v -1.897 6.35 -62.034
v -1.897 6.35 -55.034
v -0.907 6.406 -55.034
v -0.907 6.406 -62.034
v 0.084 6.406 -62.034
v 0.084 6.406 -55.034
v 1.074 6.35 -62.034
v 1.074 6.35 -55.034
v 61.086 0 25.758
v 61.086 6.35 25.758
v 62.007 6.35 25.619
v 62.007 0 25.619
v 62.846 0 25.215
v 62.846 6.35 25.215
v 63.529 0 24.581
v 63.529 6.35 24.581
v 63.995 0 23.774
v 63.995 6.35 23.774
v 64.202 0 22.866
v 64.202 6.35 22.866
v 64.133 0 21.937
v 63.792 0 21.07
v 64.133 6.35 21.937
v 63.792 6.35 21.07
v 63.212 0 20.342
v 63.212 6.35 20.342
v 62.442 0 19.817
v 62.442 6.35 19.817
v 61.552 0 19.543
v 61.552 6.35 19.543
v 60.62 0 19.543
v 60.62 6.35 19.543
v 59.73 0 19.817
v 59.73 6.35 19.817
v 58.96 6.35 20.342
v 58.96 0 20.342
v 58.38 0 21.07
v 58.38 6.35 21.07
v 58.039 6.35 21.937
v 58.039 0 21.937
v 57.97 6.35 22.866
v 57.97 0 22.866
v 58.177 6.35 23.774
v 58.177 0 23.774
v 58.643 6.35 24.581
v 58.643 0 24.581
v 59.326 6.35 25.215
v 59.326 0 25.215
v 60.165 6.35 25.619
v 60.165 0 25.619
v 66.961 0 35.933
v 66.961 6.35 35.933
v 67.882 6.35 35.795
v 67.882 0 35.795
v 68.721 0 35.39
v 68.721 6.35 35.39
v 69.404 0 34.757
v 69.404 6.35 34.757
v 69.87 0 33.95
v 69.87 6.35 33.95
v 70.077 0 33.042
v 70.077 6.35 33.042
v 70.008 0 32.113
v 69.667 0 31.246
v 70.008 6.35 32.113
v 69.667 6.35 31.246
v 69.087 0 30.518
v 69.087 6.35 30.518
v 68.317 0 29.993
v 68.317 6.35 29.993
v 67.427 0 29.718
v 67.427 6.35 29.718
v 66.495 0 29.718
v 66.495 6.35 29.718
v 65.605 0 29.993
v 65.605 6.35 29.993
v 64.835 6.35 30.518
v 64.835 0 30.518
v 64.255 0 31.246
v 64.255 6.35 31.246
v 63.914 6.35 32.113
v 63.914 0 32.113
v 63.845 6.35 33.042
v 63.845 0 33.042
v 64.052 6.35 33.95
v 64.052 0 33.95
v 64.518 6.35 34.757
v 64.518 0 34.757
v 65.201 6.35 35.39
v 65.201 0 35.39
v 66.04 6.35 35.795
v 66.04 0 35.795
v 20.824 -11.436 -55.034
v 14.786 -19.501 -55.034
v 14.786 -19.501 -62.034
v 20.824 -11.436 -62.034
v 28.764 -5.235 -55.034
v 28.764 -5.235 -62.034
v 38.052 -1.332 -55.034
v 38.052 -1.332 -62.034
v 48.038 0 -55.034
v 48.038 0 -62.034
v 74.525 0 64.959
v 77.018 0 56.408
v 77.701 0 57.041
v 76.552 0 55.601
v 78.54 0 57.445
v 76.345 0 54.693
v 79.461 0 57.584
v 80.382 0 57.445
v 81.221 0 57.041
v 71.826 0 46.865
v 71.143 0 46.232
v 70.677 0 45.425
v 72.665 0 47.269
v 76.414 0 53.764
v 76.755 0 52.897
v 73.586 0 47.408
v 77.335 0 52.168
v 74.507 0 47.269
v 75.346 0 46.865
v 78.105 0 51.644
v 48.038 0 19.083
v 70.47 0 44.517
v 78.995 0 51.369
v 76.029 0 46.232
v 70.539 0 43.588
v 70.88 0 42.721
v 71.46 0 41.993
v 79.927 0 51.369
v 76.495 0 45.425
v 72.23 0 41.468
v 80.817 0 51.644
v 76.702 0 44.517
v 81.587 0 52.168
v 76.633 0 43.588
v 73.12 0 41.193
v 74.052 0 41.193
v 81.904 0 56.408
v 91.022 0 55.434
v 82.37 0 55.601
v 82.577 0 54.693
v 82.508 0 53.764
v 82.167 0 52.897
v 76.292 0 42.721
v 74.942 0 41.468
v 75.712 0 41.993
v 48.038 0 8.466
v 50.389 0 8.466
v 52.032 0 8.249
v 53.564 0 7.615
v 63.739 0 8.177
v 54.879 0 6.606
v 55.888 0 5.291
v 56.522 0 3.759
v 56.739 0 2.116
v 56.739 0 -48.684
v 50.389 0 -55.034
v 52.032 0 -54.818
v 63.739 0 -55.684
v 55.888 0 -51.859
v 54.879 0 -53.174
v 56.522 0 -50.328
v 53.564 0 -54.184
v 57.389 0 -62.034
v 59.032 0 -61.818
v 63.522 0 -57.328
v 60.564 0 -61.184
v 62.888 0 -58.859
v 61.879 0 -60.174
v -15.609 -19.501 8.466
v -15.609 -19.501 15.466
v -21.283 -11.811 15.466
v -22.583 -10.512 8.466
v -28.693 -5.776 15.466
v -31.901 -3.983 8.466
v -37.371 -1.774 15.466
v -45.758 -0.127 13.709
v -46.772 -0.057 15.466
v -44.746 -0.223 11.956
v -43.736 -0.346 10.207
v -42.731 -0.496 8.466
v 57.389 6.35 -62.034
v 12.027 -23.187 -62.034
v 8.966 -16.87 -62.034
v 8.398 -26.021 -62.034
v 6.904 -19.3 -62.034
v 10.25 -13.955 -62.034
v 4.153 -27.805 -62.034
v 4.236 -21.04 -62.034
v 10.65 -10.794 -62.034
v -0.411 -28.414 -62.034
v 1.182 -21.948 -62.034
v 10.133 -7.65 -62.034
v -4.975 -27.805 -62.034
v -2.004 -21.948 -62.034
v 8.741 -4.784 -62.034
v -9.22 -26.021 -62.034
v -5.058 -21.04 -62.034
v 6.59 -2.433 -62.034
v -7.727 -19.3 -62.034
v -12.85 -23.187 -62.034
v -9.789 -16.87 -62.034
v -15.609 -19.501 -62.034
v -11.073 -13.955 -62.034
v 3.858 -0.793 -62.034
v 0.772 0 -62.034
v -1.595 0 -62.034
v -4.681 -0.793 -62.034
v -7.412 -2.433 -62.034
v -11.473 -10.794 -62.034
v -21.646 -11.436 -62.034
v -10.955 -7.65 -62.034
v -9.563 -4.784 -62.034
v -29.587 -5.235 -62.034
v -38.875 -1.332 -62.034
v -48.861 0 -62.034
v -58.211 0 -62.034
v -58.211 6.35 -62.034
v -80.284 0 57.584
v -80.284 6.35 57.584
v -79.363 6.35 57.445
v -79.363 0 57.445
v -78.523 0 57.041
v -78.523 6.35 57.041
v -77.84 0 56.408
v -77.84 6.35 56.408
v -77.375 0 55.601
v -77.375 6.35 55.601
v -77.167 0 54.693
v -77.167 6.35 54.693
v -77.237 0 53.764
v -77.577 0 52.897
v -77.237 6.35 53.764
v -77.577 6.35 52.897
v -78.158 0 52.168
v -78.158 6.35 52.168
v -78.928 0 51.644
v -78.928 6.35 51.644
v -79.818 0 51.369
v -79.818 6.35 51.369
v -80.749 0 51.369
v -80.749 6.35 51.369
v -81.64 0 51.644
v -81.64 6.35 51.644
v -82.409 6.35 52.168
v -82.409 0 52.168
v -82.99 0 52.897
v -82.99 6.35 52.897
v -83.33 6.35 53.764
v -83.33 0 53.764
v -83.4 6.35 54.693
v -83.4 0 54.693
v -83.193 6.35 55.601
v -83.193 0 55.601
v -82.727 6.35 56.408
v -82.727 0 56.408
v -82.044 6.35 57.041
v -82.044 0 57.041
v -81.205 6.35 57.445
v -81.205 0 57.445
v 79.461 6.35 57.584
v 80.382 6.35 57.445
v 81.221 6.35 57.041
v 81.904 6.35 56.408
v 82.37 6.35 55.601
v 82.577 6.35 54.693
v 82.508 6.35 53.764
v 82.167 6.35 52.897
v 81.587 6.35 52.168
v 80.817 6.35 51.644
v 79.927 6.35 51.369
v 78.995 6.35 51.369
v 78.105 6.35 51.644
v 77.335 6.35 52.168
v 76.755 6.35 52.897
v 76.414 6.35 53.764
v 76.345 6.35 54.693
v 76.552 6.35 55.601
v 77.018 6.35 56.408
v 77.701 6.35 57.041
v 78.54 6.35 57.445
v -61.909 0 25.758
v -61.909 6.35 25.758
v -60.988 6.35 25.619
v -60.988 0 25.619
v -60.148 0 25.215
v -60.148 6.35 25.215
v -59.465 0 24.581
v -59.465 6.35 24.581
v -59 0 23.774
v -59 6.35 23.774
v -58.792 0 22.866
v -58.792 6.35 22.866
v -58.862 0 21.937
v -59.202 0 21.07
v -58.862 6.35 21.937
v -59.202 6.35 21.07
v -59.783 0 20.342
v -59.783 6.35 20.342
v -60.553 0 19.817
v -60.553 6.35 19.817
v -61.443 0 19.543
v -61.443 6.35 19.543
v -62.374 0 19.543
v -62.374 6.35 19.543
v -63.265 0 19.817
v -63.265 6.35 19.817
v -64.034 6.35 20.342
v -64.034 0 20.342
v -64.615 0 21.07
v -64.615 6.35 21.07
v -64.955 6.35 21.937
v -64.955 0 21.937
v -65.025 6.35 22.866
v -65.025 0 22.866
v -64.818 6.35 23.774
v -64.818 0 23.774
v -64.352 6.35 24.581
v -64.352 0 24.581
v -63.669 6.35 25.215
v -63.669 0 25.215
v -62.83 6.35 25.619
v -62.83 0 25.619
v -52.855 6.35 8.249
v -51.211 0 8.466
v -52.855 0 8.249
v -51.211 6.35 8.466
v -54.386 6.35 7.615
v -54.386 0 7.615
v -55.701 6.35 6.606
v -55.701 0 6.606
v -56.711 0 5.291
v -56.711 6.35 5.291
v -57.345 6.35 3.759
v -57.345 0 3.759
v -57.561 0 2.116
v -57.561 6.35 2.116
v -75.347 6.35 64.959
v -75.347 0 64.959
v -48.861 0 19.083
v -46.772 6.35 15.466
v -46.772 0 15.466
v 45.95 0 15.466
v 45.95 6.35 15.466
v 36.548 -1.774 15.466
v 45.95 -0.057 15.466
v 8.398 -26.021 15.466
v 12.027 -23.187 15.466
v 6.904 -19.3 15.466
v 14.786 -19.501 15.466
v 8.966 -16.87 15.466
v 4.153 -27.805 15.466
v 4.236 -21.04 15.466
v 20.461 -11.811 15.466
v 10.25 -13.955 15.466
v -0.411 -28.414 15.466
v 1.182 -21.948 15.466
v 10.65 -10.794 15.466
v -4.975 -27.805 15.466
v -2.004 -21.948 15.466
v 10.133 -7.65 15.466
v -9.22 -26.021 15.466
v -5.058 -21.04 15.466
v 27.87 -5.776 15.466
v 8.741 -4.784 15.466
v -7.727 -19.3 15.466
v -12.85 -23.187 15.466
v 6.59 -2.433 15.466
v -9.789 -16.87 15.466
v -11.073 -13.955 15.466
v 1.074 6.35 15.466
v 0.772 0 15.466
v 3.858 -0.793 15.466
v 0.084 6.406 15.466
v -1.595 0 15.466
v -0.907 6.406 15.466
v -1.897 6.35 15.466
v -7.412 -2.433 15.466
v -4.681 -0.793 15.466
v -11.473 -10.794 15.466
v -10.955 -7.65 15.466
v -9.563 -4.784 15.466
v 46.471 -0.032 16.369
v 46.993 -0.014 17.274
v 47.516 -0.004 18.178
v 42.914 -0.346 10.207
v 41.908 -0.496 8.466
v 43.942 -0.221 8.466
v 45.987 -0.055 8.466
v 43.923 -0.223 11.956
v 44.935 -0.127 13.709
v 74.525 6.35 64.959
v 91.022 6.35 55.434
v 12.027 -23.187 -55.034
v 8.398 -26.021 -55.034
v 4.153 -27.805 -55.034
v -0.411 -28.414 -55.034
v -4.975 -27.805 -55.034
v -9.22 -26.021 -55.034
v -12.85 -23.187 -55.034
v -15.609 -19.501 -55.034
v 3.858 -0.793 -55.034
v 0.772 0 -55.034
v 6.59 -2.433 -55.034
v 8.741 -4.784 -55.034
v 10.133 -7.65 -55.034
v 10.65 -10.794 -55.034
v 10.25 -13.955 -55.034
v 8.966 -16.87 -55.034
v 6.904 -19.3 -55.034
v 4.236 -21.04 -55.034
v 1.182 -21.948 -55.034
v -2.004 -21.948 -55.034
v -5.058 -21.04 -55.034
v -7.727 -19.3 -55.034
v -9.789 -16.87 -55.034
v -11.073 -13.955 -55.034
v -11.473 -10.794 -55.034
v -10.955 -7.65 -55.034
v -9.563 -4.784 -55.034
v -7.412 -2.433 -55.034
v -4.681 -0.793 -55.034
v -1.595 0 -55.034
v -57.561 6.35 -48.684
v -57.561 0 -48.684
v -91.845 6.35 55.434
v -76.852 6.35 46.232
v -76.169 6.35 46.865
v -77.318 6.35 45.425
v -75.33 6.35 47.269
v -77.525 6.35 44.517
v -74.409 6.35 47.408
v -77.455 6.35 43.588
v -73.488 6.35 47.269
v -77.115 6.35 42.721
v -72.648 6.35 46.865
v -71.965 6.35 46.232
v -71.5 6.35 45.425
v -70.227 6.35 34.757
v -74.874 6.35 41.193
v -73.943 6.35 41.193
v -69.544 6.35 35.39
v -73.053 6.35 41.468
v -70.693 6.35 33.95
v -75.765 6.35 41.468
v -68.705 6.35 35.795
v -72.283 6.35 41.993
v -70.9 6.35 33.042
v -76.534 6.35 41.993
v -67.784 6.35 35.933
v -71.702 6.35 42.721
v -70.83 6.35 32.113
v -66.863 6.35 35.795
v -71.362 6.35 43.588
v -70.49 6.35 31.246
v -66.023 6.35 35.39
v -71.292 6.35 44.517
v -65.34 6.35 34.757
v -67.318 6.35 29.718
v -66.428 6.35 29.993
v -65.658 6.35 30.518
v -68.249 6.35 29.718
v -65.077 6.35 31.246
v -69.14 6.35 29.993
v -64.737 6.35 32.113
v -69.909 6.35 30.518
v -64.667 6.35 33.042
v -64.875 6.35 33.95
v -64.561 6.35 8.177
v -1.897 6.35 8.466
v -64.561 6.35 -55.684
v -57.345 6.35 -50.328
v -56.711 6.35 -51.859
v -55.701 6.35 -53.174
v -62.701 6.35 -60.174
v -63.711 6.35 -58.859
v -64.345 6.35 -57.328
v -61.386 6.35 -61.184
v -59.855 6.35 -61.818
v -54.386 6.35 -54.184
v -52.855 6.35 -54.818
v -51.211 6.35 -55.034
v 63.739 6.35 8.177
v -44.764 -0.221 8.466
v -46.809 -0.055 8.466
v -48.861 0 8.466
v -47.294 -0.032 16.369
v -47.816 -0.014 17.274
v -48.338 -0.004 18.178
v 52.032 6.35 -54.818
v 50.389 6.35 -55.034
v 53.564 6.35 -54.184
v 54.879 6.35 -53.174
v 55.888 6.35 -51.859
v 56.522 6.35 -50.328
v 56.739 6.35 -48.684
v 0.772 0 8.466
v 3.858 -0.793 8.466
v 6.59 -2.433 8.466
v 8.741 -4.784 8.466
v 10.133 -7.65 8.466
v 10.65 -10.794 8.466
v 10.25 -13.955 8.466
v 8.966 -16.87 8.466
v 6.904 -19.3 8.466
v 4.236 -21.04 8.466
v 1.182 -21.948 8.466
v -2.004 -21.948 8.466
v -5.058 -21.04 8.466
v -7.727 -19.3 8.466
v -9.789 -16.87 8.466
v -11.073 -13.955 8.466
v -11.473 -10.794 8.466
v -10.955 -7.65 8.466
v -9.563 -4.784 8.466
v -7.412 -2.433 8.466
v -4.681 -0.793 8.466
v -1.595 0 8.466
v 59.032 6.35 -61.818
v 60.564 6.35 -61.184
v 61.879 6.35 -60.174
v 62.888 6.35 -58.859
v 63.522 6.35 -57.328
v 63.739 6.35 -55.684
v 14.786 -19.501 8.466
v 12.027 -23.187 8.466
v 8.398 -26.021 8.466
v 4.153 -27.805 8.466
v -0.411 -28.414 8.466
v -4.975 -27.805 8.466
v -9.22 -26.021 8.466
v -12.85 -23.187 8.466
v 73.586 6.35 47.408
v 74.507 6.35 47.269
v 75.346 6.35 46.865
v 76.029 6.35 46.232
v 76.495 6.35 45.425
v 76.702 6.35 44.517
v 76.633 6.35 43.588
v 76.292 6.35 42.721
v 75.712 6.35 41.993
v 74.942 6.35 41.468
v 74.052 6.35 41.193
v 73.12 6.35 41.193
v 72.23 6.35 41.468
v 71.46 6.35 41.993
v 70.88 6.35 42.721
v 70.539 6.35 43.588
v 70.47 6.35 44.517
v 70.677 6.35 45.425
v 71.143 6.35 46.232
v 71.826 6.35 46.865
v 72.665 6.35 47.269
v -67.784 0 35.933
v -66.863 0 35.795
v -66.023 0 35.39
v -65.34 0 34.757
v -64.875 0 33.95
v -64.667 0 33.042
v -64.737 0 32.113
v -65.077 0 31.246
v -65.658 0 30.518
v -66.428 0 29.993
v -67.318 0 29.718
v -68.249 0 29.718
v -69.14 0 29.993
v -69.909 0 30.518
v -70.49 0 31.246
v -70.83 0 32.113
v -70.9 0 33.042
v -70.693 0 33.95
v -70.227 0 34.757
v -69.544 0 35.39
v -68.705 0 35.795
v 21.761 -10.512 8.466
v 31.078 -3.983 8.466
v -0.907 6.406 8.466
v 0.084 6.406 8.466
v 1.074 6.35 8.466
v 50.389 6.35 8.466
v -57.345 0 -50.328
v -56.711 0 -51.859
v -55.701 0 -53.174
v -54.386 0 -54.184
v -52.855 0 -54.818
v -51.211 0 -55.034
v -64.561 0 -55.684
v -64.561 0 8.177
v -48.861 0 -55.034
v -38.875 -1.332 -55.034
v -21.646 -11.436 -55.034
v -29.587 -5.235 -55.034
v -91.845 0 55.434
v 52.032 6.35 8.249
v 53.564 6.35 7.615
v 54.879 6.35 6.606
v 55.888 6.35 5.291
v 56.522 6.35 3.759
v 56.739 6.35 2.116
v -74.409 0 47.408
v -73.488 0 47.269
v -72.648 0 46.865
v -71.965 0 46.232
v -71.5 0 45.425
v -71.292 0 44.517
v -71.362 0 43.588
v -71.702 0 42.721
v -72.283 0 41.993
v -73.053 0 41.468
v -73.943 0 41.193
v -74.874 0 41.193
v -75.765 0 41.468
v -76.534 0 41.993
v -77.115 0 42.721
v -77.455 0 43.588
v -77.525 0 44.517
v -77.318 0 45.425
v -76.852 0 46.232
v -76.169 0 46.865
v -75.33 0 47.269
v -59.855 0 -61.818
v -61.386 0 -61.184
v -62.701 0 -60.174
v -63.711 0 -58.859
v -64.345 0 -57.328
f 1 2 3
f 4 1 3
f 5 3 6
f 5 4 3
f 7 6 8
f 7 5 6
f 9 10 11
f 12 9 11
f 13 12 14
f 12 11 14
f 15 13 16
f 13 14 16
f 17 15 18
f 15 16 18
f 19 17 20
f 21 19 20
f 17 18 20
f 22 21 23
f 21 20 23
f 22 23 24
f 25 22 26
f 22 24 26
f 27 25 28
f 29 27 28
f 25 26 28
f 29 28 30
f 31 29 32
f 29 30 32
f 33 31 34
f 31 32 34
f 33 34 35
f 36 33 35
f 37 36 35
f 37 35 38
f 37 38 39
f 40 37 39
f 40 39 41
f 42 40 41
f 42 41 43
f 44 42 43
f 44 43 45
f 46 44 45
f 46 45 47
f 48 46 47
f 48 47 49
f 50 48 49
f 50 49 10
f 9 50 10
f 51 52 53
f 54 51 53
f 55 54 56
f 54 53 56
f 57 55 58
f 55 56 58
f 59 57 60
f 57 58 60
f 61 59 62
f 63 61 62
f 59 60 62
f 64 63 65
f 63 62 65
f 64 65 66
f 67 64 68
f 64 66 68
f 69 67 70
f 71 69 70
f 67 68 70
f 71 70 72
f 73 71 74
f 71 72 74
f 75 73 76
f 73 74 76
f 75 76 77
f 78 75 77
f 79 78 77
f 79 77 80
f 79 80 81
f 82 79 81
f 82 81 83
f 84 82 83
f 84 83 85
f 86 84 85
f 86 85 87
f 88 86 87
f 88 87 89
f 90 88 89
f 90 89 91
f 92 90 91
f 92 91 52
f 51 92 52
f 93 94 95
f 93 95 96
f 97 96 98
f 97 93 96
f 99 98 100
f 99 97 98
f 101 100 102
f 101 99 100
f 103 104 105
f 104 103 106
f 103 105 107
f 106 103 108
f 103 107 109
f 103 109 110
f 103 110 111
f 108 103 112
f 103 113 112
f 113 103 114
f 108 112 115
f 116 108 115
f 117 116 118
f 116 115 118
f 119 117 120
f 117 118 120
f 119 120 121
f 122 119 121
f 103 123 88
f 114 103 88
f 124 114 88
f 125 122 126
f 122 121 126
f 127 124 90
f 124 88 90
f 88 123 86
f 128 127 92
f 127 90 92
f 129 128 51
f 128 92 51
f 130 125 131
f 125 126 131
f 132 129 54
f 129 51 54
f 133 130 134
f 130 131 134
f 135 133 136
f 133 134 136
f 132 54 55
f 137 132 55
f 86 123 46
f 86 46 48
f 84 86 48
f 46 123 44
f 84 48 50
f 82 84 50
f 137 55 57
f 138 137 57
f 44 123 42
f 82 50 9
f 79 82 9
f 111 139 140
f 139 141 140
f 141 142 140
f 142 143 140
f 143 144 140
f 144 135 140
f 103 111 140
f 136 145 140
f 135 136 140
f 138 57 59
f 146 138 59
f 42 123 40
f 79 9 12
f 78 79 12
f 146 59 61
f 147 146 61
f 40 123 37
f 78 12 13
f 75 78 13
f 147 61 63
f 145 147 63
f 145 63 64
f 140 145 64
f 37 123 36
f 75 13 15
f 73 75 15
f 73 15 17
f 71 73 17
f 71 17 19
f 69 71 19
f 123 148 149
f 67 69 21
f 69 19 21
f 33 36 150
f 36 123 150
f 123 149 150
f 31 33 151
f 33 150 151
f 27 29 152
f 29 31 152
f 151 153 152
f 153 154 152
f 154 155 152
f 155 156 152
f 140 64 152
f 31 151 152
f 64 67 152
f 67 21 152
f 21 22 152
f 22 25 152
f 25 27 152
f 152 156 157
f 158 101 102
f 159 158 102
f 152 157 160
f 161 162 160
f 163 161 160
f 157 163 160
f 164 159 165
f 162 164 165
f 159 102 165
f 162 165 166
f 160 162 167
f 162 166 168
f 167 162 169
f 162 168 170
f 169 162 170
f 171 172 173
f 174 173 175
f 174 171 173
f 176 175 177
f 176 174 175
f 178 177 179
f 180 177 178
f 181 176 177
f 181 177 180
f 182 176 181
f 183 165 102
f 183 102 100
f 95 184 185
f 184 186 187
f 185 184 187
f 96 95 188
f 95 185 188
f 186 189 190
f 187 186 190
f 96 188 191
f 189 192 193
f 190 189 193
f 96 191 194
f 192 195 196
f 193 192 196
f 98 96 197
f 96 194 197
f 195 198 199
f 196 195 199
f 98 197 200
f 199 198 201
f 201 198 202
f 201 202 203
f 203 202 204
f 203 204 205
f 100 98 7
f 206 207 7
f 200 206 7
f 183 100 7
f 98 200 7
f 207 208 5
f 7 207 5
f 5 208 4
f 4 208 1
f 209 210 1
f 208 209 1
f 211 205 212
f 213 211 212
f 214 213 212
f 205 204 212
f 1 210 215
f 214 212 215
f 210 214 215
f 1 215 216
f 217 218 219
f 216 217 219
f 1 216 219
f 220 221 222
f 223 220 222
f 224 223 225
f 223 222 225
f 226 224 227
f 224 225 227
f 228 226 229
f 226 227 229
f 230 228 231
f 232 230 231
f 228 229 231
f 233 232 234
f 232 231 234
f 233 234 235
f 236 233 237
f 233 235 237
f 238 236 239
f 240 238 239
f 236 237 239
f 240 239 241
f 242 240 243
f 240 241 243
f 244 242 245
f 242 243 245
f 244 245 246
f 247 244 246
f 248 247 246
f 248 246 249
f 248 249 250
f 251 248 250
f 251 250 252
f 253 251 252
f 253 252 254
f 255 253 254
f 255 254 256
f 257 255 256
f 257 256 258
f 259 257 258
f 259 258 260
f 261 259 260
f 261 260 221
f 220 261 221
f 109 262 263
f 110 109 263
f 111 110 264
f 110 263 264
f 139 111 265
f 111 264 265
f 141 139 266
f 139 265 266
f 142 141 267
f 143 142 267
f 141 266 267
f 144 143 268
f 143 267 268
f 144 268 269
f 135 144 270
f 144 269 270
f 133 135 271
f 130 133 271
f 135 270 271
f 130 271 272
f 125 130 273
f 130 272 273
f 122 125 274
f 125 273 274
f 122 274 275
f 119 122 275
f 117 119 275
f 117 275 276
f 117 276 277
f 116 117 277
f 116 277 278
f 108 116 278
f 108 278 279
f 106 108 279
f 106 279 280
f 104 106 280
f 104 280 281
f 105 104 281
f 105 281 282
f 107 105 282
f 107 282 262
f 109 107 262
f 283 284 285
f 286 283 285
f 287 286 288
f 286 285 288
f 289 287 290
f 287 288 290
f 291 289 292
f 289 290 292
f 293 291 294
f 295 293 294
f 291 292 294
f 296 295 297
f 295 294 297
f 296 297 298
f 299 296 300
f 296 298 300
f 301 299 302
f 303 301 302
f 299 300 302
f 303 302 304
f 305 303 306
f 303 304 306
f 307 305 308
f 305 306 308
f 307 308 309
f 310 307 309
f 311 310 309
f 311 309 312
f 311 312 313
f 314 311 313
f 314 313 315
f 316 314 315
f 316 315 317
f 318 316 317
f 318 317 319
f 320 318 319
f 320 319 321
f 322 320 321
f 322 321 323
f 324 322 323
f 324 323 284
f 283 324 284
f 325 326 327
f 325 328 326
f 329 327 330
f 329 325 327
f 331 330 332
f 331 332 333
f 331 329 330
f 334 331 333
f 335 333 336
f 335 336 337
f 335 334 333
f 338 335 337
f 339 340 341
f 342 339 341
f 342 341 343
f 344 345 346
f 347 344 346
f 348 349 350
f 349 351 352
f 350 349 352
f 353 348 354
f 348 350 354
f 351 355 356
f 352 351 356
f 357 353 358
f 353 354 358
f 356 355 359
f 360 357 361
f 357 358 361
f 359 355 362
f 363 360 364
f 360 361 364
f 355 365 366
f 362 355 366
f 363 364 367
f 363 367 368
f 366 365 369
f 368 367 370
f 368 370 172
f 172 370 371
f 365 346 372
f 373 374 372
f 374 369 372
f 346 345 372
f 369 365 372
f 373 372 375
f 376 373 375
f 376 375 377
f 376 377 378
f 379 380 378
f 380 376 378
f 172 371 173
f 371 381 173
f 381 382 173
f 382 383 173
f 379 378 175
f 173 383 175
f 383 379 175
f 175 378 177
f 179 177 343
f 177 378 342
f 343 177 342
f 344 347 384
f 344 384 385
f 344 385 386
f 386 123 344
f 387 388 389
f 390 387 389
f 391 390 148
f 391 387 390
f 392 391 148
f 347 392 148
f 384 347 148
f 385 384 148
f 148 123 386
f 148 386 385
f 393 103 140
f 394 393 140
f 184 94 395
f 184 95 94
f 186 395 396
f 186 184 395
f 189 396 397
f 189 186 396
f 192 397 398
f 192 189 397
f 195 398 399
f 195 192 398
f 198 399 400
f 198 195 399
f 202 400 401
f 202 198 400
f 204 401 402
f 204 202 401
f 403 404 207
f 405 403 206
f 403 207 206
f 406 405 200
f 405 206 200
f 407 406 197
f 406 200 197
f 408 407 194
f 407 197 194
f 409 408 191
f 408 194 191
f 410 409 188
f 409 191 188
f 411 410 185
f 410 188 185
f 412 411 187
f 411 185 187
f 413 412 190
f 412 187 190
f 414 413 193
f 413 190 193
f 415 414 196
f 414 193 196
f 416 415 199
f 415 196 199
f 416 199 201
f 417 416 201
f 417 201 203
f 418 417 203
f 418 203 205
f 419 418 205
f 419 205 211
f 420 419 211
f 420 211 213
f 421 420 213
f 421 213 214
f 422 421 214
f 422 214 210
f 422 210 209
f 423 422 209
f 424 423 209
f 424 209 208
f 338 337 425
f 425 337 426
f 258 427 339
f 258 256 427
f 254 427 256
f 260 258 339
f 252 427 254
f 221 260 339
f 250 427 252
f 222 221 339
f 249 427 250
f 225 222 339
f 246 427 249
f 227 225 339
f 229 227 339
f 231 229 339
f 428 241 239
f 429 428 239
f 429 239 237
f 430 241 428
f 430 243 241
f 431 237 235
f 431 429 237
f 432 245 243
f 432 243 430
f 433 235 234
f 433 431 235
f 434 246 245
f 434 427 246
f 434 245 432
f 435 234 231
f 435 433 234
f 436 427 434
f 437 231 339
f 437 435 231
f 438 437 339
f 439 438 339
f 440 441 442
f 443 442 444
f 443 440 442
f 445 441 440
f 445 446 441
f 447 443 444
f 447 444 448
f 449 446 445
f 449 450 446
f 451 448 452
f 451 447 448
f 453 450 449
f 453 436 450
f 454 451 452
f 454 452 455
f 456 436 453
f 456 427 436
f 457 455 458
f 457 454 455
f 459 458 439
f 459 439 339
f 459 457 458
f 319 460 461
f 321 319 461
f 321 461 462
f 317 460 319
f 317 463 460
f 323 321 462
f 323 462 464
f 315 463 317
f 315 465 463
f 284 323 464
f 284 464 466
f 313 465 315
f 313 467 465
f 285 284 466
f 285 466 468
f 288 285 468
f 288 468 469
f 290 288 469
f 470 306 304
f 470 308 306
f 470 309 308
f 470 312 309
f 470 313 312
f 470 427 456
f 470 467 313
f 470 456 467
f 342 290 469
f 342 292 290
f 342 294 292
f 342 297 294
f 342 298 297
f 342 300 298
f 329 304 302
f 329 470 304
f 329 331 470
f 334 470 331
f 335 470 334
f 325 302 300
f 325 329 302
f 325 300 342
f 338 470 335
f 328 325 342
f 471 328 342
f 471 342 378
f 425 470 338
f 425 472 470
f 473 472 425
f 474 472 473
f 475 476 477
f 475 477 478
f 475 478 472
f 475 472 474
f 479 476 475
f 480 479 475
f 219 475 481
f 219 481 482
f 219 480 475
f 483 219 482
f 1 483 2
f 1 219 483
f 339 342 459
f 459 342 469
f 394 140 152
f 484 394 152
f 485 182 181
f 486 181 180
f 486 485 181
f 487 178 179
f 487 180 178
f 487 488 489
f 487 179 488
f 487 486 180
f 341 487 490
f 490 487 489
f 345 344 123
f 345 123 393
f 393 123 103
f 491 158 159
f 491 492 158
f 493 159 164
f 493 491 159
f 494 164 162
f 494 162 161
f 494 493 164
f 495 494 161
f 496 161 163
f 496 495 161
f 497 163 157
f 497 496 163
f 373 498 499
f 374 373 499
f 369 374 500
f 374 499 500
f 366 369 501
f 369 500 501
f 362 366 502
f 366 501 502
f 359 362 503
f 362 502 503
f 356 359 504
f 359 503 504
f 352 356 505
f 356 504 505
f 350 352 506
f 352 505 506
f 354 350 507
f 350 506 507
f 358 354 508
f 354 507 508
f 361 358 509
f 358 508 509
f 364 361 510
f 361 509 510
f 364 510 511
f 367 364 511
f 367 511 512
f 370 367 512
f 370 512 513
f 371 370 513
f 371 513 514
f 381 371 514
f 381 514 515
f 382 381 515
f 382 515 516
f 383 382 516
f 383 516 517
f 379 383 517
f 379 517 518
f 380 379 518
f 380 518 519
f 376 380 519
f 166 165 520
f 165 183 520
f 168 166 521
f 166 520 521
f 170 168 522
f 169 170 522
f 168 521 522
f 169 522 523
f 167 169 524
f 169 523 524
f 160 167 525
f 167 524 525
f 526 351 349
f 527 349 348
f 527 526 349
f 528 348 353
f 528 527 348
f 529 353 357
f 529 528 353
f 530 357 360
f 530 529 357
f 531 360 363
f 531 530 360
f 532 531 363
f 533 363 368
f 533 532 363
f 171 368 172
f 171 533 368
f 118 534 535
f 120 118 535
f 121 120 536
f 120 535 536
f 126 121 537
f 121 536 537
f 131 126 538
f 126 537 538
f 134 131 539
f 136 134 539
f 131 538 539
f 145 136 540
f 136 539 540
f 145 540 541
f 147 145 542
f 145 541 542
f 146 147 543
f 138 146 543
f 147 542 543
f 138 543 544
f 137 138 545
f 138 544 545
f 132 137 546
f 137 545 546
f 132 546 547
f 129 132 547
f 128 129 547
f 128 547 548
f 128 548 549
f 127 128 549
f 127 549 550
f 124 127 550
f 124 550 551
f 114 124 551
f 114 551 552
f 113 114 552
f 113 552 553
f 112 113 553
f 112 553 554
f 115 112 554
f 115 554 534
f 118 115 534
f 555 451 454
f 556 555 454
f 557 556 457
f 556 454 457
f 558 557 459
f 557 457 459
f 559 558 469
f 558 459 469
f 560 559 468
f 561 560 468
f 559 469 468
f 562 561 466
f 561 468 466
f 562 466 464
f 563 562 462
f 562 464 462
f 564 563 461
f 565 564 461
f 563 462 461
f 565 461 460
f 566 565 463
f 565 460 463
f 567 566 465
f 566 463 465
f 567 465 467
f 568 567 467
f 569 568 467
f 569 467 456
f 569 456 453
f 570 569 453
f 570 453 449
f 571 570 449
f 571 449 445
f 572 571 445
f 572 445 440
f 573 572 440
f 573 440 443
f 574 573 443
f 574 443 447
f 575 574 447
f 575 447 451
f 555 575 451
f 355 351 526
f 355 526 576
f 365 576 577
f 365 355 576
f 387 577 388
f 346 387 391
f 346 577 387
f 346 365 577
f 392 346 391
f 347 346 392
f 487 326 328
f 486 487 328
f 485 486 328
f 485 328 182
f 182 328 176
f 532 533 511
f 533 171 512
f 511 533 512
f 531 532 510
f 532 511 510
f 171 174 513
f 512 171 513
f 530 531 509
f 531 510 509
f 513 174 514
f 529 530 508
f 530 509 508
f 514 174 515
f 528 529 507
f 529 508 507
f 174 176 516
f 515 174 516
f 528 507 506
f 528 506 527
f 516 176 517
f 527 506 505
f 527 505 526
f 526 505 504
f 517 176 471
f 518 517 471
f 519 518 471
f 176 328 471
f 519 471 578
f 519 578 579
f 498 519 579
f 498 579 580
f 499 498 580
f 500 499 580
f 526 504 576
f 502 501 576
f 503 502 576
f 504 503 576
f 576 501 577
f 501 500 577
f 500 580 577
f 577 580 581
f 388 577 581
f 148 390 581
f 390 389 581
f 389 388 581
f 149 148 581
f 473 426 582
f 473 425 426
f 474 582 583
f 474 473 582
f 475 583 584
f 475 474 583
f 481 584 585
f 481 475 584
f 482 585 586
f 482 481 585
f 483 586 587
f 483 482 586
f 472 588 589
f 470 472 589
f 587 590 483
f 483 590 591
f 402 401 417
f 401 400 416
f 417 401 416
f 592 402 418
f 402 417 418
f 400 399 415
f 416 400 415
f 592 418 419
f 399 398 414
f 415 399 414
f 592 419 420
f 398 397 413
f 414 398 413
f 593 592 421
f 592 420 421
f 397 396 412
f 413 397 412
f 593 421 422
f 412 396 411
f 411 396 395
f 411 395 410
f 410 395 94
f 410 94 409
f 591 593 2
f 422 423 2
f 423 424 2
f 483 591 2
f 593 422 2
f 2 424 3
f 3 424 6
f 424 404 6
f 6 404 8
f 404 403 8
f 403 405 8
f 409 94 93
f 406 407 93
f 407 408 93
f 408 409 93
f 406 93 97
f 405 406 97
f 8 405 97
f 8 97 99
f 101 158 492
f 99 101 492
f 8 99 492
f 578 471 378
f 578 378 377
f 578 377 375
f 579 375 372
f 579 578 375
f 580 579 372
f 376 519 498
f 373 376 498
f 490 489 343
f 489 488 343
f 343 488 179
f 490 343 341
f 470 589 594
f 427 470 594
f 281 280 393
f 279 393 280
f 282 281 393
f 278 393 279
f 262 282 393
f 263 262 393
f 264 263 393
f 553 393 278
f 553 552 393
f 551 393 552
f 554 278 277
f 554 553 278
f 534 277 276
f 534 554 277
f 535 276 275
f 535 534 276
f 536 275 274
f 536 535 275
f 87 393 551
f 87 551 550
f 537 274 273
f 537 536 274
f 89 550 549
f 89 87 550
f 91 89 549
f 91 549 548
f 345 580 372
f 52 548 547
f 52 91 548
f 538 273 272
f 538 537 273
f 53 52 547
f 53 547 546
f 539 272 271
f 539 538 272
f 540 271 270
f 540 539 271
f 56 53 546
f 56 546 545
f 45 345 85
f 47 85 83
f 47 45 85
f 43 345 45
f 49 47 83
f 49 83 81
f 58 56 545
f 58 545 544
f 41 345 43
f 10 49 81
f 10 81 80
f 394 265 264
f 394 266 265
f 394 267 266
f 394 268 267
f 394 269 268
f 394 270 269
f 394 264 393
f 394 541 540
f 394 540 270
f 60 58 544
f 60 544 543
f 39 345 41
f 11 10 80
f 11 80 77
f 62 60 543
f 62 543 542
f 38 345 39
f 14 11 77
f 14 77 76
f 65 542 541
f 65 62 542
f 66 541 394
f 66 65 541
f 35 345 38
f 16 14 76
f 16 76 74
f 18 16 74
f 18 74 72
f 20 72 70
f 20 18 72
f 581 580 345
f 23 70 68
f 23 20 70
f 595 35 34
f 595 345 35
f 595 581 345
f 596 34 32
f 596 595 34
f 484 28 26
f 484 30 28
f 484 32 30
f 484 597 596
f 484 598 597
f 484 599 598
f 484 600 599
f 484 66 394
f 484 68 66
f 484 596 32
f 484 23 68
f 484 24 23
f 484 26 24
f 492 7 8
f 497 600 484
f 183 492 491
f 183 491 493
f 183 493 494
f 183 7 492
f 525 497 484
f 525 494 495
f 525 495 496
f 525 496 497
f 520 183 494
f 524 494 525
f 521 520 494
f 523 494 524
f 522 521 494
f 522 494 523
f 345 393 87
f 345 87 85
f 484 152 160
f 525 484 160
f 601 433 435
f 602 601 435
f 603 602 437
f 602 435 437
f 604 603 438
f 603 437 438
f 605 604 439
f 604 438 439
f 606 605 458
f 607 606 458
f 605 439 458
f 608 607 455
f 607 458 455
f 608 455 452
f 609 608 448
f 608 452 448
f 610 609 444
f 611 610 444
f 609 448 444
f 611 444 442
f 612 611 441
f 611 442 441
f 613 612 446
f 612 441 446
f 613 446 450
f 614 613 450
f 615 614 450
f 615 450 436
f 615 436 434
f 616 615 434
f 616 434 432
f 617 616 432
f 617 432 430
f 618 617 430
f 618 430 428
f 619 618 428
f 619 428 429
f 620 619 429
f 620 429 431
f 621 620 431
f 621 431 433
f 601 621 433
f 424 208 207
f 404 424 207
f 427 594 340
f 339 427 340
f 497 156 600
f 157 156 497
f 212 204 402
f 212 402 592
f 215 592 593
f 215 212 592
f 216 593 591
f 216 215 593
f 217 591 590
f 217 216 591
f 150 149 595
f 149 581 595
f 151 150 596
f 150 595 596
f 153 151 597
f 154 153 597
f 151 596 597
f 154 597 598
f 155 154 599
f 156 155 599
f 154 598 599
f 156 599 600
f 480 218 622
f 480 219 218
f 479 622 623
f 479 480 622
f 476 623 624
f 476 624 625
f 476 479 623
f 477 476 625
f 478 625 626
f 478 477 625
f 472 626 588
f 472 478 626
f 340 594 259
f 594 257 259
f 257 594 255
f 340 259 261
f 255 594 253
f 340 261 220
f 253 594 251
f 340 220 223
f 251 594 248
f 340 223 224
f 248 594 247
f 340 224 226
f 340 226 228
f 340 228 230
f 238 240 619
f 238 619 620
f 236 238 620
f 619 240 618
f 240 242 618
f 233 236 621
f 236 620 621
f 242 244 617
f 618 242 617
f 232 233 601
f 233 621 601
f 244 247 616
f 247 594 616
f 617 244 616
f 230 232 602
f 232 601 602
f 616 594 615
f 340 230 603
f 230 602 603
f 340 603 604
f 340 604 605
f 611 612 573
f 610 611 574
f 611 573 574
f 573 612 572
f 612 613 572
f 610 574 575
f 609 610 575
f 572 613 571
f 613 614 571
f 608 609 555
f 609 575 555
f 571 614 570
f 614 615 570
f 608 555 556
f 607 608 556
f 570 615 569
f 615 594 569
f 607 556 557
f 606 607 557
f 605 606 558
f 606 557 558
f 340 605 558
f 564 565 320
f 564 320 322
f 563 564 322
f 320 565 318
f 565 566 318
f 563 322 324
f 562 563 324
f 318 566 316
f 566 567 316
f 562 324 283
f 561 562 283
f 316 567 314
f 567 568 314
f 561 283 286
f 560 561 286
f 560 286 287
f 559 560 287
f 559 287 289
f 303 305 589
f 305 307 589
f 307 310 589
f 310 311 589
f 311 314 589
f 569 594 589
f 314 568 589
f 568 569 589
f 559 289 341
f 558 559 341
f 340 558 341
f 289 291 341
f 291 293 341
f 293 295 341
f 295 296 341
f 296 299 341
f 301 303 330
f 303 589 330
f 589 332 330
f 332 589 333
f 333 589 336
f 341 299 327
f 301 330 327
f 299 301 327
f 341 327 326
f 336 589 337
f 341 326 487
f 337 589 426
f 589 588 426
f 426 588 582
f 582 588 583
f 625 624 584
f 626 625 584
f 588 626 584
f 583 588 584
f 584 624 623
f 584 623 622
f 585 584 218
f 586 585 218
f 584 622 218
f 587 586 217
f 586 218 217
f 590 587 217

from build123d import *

# Parameters (mm, degrees)
SKETCH2_W               = 114.3
SKETCH2_H               = 63.5
BOSS_EXTRUDE1_DEPTH     = 6.35
CUT_EXTRUDE1_REACH      = 114.674
SKETCH3_R               = 3.125
BOSS_EXTRUDE7_REACH     = 158.854
SKETCH5_R               = 17.4135
SKETCH5_R_2             = 11.0635
FILLET1_R               = 38.1
CUT_EXTRUDE2_DEPTH      = 118.744132595
CUT_EXTRUDE2_DEPTH_BACK = 118.744132595
SKETCH6_W               = 114.3
SKETCH6_H               = 63.5
FILLET2_R               = 6.35


with BuildPart() as part:
    # Sketch2 → Boss-Extrude1 (new body)
    with BuildSketch(Plane(origin=(0, 0, 0), x_dir=(1, 0, 0), z_dir=(0, 1, 0))):
        Polygon((-64.561316825, 62.034331754), (-64.561316825, -8.177280248), (-91.845008266, -55.434020042), (-75.347224324, -64.959020042), (-46.772224324, -15.465668216), (45.949590674, -15.465668216), (74.524590674, -64.959020042), (91.022374616, -55.434020042), (63.738683175, -8.177280248), (63.738683175, 62.034331754), align=None)
        with Locations((-0.411316825, 23.284331754)):
            Rectangle(SKETCH2_W, SKETCH2_H, mode=Mode.SUBTRACT)
    extrude(amount=BOSS_EXTRUDE1_DEPTH)

    # Sketch3 → Cut-Extrude1 (cut, up to next)
    with BuildSketch(Plane(origin=(0, 6.35, 0), x_dir=(1, 0, 0), z_dir=(0, 1, 0)), mode=Mode.PRIVATE) as cut_extrude1_sk1:
        with Locations(Location((-67.783616297, -32.808466651, 0), (0, 0, 270))):
            Circle(SKETCH3_R)
    cut_extrude1_tool1 = extrude(cut_extrude1_sk1.sketch, amount=-CUT_EXTRUDE1_REACH, mode=Mode.PRIVATE) & part.part
    # Sketch3 → Cut-Extrude1 (cut, up to next)
    with BuildSketch(Plane(origin=(0, 6.35, 0), x_dir=(1, 0, 0), z_dir=(0, 1, 0)), mode=Mode.PRIVATE) as cut_extrude1_sk2:
        with Locations(Location((-61.908616236, -22.632668051, 0), (0, 0, 270))):
            Circle(SKETCH3_R)
    cut_extrude1_tool2 = extrude(cut_extrude1_sk2.sketch, amount=-CUT_EXTRUDE1_REACH, mode=Mode.PRIVATE) & part.part
    # Sketch3 → Cut-Extrude1 (cut, up to next)
    with BuildSketch(Plane(origin=(0, 6.35, 0), x_dir=(1, 0, 0), z_dir=(0, 1, 0)), mode=Mode.PRIVATE) as cut_extrude1_sk3:
        with Locations(Location((-74.408616255, -44.283303179, 0), (0, 0, 270))):
            Circle(SKETCH3_R)
    cut_extrude1_tool3 = extrude(cut_extrude1_sk3.sketch, amount=-CUT_EXTRUDE1_REACH, mode=Mode.PRIVATE) & part.part
    # Sketch3 → Cut-Extrude1 (cut, up to next)
    with BuildSketch(Plane(origin=(0, 6.35, 0), x_dir=(1, 0, 0), z_dir=(0, 1, 0)), mode=Mode.PRIVATE) as cut_extrude1_sk4:
        with Locations(Location((-80.283616316, -54.459101779, 0), (0, 0, 270))):
            Circle(SKETCH3_R)
    cut_extrude1_tool4 = extrude(cut_extrude1_sk4.sketch, amount=-CUT_EXTRUDE1_REACH, mode=Mode.PRIVATE) & part.part
    # Sketch3 → Cut-Extrude1 (cut, up to next)
    with BuildSketch(Plane(origin=(0, 6.35, 0), x_dir=(1, 0, 0), z_dir=(0, 1, 0)), mode=Mode.PRIVATE) as cut_extrude1_sk5:
        with Locations(Location((79.460982666, -54.459101779, 0), (0, 0, 270))):
            Circle(SKETCH3_R)
    cut_extrude1_tool5 = extrude(cut_extrude1_sk5.sketch, amount=-CUT_EXTRUDE1_REACH, mode=Mode.PRIVATE) & part.part
    # Sketch3 → Cut-Extrude1 (cut, up to next)
    with BuildSketch(Plane(origin=(0, 6.35, 0), x_dir=(1, 0, 0), z_dir=(0, 1, 0)), mode=Mode.PRIVATE) as cut_extrude1_sk6:
        with Locations(Location((73.585982605, -44.283303179, 0), (0, 0, 270))):
            Circle(SKETCH3_R)
    cut_extrude1_tool6 = extrude(cut_extrude1_sk6.sketch, amount=-CUT_EXTRUDE1_REACH, mode=Mode.PRIVATE) & part.part
    # Sketch3 → Cut-Extrude1 (cut, up to next)
    with BuildSketch(Plane(origin=(0, 6.35, 0), x_dir=(1, 0, 0), z_dir=(0, 1, 0)), mode=Mode.PRIVATE) as cut_extrude1_sk7:
        with Locations(Location((61.085982586, -22.632668051, 0), (0, 0, 270))):
            Circle(SKETCH3_R)
    cut_extrude1_tool7 = extrude(cut_extrude1_sk7.sketch, amount=-CUT_EXTRUDE1_REACH, mode=Mode.PRIVATE) & part.part
    # Sketch3 → Cut-Extrude1 (cut, up to next)
    with BuildSketch(Plane(origin=(0, 6.35, 0), x_dir=(1, 0, 0), z_dir=(0, 1, 0)), mode=Mode.PRIVATE) as cut_extrude1_sk8:
        with Locations(Location((66.960982647, -32.808466651, 0), (0, 0, 270))):
            Circle(SKETCH3_R)
    cut_extrude1_tool8 = extrude(cut_extrude1_sk8.sketch, amount=-CUT_EXTRUDE1_REACH, mode=Mode.PRIVATE) & part.part
    add(cut_extrude1_tool1.solids().sort_by_distance((-67.783616, 6.35, 32.808467))[0], mode=Mode.SUBTRACT)
    add(cut_extrude1_tool2.solids().sort_by_distance((-61.908616, 6.35, 22.632668))[0], mode=Mode.SUBTRACT)
    add(cut_extrude1_tool3.solids().sort_by_distance((-74.408616, 6.35, 44.283303))[0], mode=Mode.SUBTRACT)
    add(cut_extrude1_tool4.solids().sort_by_distance((-80.283616, 6.35, 54.459102))[0], mode=Mode.SUBTRACT)
    add(cut_extrude1_tool5.solids().sort_by_distance((79.460983, 6.35, 54.459102))[0], mode=Mode.SUBTRACT)
    add(cut_extrude1_tool6.solids().sort_by_distance((73.585983, 6.35, 44.283303))[0], mode=Mode.SUBTRACT)
    add(cut_extrude1_tool7.solids().sort_by_distance((61.085983, 6.35, 22.632668))[0], mode=Mode.SUBTRACT)
    add(cut_extrude1_tool8.solids().sort_by_distance((66.960983, 6.35, 32.808467))[0], mode=Mode.SUBTRACT)

    # Boss-Extrude7: up to this face of the body (flat: up to its plane)
    boss_extrude7_end = Plane(part.part.faces().sort_by_distance((-0.411316825, 3.175, 15.465668216))[0])
    # Sketch5 → Boss-Extrude7 (add, up to the picked face)
    with BuildSketch(Plane(origin=(0, 0, -62.034331754), x_dir=(-1, 0, 0), z_dir=(0, 0, -1)), mode=Mode.PRIVATE) as boss_extrude7_sk1:
        with Locations(Location((0.411316825, -11, 0), (0, 0, 39.175198934))):
            Circle(SKETCH5_R)
        with Locations(Location((0.411316825, -11, 0), (0, 0, 83.858334426))):
            Circle(SKETCH5_R_2, mode=Mode.SUBTRACT)
    boss_extrude7_tool1 = split(extrude(boss_extrude7_sk1.sketch, amount=-BOSS_EXTRUDE7_REACH, mode=Mode.PRIVATE), bisect_by=boss_extrude7_end, keep=Keep.BOTH, mode=Mode.PRIVATE)
    add(boss_extrude7_tool1.solids().sort_by(Axis((12.706125, -21.688873, -62.034332), (0, 0, 1)))[0])

    # Fillet1
    # the kernel refuses this fillet: 38.1 mm, written as the material it adds along each edge
    with BuildSketch(Plane(origin=(-13.910575406, 0, -62.034331754), x_dir=(-0.0867632885558369, -0.9962289554911443, 0), z_dir=(0, 0, 1))) as fillet1_piece_1:
        with BuildLine():
            CenterArc((40.988707325, -31.512603208), FILLET1_R, 124.197770407, 60.77965812)
            Line((3.032384121, -34.818284502), (0, 0))
            ThreePointArc((0, 0), (9.787278443, -3.010751549), (19.574556886, 0))
        make_face()
    extrude(amount=7)
    with BuildSketch(Plane(origin=(-13.910575406, 0, -62.034331754), x_dir=(-0.0867632885558369, -0.9962289554911443, 0), z_dir=(0, 0, 1))) as fillet1_piece_2_section:
        with BuildLine():
            CenterArc((40.988707325, -31.512603208), FILLET1_R, 124.197770407, 60.77965812)
            Line((3.032384121, -34.818284502), (0, 0))
            ThreePointArc((0, 0), (9.787278443, -3.010751549), (19.574556886, 0))
        make_face()
    fillet1_piece_2 = extrude(amount=94.37520705, mode=Mode.PRIVATE)
    fillet1_piece_2 = split(fillet1_piece_2, bisect_by=Plane(origin=(-46.479711347, 0.329171961, 15.465668216), z_dir=(0, 0, -1)), keep=Keep.TOP, mode=Mode.PRIVATE)
    fillet1_piece_2 = split(fillet1_piece_2, bisect_by=Plane(origin=(-46.479711347, 0.329171961, 8.465668246), z_dir=(0, 0, 1)), keep=Keep.TOP, mode=Mode.PRIVATE)
    fillet1_piece_2 = split(fillet1_piece_2, bisect_by=Plane(origin=(-44.894051642, 0.329171961, 12.212577706), z_dir=(-0.8660254037844385, 0, -0.5000000000000003)), keep=Keep.TOP, mode=Mode.PRIVATE)
    add(fillet1_piece_2)
    with BuildSketch(Plane(origin=(-13.910575406, 0, -62.034331754), x_dir=(-0.0867632885558369, -0.9962289554911443, 0), z_dir=(0, 0, 1))) as fillet1_piece_3_section:
        with BuildLine():
            CenterArc((40.988707325, -31.512603208), FILLET1_R, 124.197770407, 60.77965812)
            Line((3.032384121, -34.818284502), (0, 0))
            ThreePointArc((0, 0), (9.787278443, -3.010751549), (19.574556886, 0))
        make_face()
    fillet1_piece_3 = extrude(amount=94.37520705, mode=Mode.PRIVATE)
    fillet1_piece_3 = split(fillet1_piece_3, bisect_by=Plane(origin=(-48.157624669, 0.376146064, 15.465668216), z_dir=(0, 0, 1)), keep=Keep.TOP, mode=Mode.PRIVATE)
    fillet1_piece_3 = split(fillet1_piece_3, bisect_by=Plane(origin=(-47.638099539, 0.376146064, 16.965408082), z_dir=(-0.8660254037844385, 0, -0.5000000000000003)), keep=Keep.TOP, mode=Mode.PRIVATE)
    add(fillet1_piece_3)
    with BuildSketch(Plane(origin=(-13.910575406, 0, -62.034331754), x_dir=(-0.0867632885558369, -0.9962289554911443, 0), z_dir=(0, 0, 1))) as fillet1_piece_4_section:
        with BuildLine():
            CenterArc((40.988707325, -31.512603208), FILLET1_R, 124.197770407, 60.77965812)
            Line((3.032384121, -34.818284502), (0, 0))
            ThreePointArc((0, 0), (9.787278443, -3.010751549), (19.574556886, 0))
        make_face()
    fillet1_piece_4 = extrude(amount=94.37520705, mode=Mode.PRIVATE)
    fillet1_piece_4 = split(fillet1_piece_4, bisect_by=Plane(origin=(-24.321436326, -4.363073993, 15.465668216), z_dir=(0, 0, -1)), keep=Keep.TOP, mode=Mode.PRIVATE)
    fillet1_piece_4 = split(fillet1_piece_4, bisect_by=Plane(origin=(-24.321436326, -4.363073993, 8.465668246), z_dir=(0, 0, 1)), keep=Keep.TOP, mode=Mode.PRIVATE)
    fillet1_piece_4 = split(fillet1_piece_4, bisect_by=Plane(origin=(-39.648984709, -4.363073993, 3.127855288), z_dir=(0.8660254037844385, 0, 0.5000000000000003)), keep=Keep.TOP, mode=Mode.PRIVATE)
    add(fillet1_piece_4)
    with BuildSketch(Plane(origin=(13.087941757, 0, 32.340875296), x_dir=(0.08676328855268206, -0.9962289554914191, 0), z_dir=(0, 0, -1))) as fillet1_piece_5_section:
        with BuildLine():
            CenterArc((40.988707325, -31.512603208), FILLET1_R, 124.197770407, 60.77965812)
            Line((3.032384121, -34.818284502), (0, 0))
            ThreePointArc((0, 0), (9.787278443, -3.010751549), (19.574556886, 0))
        make_face()
    fillet1_piece_5 = extrude(amount=94.37520705, mode=Mode.PRIVATE)
    fillet1_piece_5 = split(fillet1_piece_5, bisect_by=Plane(origin=(47.334991019, 0.376146064, 15.465668216), z_dir=(0, 0, 1)), keep=Keep.TOP, mode=Mode.PRIVATE)
    fillet1_piece_5 = split(fillet1_piece_5, bisect_by=Plane(origin=(46.81546589, 0.376146064, 16.965408082), z_dir=(0.8660254037844373, 0, -0.5000000000000024)), keep=Keep.TOP, mode=Mode.PRIVATE)
    add(fillet1_piece_5)
    with BuildSketch(Plane(origin=(13.087941757, 0, 32.340875296), x_dir=(0.08676328855268206, -0.9962289554914191, 0), z_dir=(0, 0, -1))) as fillet1_piece_6_section:
        with BuildLine():
            CenterArc((40.988707325, -31.512603208), FILLET1_R, 124.197770407, 60.77965812)
            Line((3.032384121, -34.818284502), (0, 0))
            ThreePointArc((0, 0), (9.787278443, -3.010751549), (19.574556886, 0))
        make_face()
    fillet1_piece_6 = extrude(amount=94.37520705, mode=Mode.PRIVATE)
    fillet1_piece_6 = split(fillet1_piece_6, bisect_by=Plane(origin=(23.498802677, -4.363073993, 15.465668216), z_dir=(0, 0, -1)), keep=Keep.TOP, mode=Mode.PRIVATE)
    fillet1_piece_6 = split(fillet1_piece_6, bisect_by=Plane(origin=(38.826351059, -4.363073993, 3.127855288), z_dir=(-0.8660254037844373, 0, 0.5000000000000024)), keep=Keep.TOP, mode=Mode.PRIVATE)
    fillet1_piece_6 = split(fillet1_piece_6, bisect_by=Plane(origin=(23.498802677, -4.363073993, 8.465668246), z_dir=(0, 0, 1)), keep=Keep.TOP, mode=Mode.PRIVATE)
    add(fillet1_piece_6)
    with BuildSketch(Plane(origin=(13.087941757, 0, 32.340875296), x_dir=(0.08676328855268206, -0.9962289554914191, 0), z_dir=(0, 0, -1))) as fillet1_piece_7_section:
        with BuildLine():
            CenterArc((40.988707325, -31.512603208), FILLET1_R, 124.197770407, 60.77965812)
            Line((3.032384121, -34.818284502), (0, 0))
            ThreePointArc((0, 0), (9.787278443, -3.010751549), (19.574556886, 0))
        make_face()
    fillet1_piece_7 = extrude(amount=94.37520705, mode=Mode.PRIVATE)
    fillet1_piece_7 = split(fillet1_piece_7, bisect_by=Plane(origin=(45.657077697, 0.329171961, 15.465668216), z_dir=(0, 0, -1)), keep=Keep.TOP, mode=Mode.PRIVATE)
    fillet1_piece_7 = split(fillet1_piece_7, bisect_by=Plane(origin=(44.071417993, 0.329171961, 12.212577706), z_dir=(0.8660254037844373, 0, -0.5000000000000024)), keep=Keep.TOP, mode=Mode.PRIVATE)
    fillet1_piece_7 = split(fillet1_piece_7, bisect_by=Plane(origin=(45.657077697, 0.329171961, 8.465668246), z_dir=(0, 0, 1)), keep=Keep.TOP, mode=Mode.PRIVATE)
    add(fillet1_piece_7)
    with BuildSketch(Plane(origin=(13.087941757, 0, -55.034331754), x_dir=(0.08676328855268206, -0.9962289554914191, 0), z_dir=(0, 0, -1))) as fillet1_piece_8:
        with BuildLine():
            CenterArc((40.988707325, -31.512603208), FILLET1_R, 124.197770407, 60.77965812)
            Line((3.032384121, -34.818284502), (0, 0))
            ThreePointArc((0, 0), (9.787278443, -3.010751549), (19.574556886, 0))
        make_face()
    extrude(amount=7)
    with BuildSketch(Plane(origin=(13.087941757, 0, 102.840875266), x_dir=(0.08676328855268206, -0.9962289554914191, 0), z_dir=(0, 0, -1))) as fillet1_piece_9_section:
        with BuildLine():
            CenterArc((40.988707325, -31.512603208), FILLET1_R, 124.197770407, 60.77965812)
            Line((3.032384121, -34.818284502), (0, 0))
            ThreePointArc((0, 0), (9.787278443, -3.010751549), (19.574556886, 0))
        make_face()
    fillet1_piece_9 = extrude(amount=94.37520702, mode=Mode.PRIVATE)
    fillet1_piece_9 = split(fillet1_piece_9, bisect_by=Plane(origin=(47.334991019, 0.376146064, 15.465668216), z_dir=(0, 0, 1)), keep=Keep.TOP, mode=Mode.PRIVATE)
    fillet1_piece_9 = split(fillet1_piece_9, bisect_by=Plane(origin=(46.81546589, 0.376146064, 16.965408082), z_dir=(0.8660254037844373, 0, -0.5000000000000024)), keep=Keep.TOP, mode=Mode.PRIVATE)
    add(fillet1_piece_9)
    with BuildSketch(Plane(origin=(13.087941757, 0, 15.465668216), x_dir=(0.08676328855268206, -0.9962289554914191, 0), z_dir=(0, 0, -1))) as fillet1_piece_10_section:
        with BuildLine():
            CenterArc((40.988707325, -31.512603208), FILLET1_R, 124.197770407, 60.77965812)
            Line((3.032384121, -34.818284502), (0, 0))
            ThreePointArc((0, 0), (9.787278443, -3.010751549), (19.574556886, 0))
        make_face()
    fillet1_piece_10 = extrude(amount=6.99999997, mode=Mode.PRIVATE)
    fillet1_piece_10 = split(fillet1_piece_10, bisect_by=Plane(origin=(38.826351059, -4.363073993, 3.127855288), z_dir=(-0.8660254037844373, 0, 0.5000000000000024)), keep=Keep.TOP, mode=Mode.PRIVATE)
    add(fillet1_piece_10)
    with BuildSketch(Plane(origin=(13.087941757, 0, 15.465668216), x_dir=(0.08676328855268206, -0.9962289554914191, 0), z_dir=(0, 0, -1))) as fillet1_piece_11_section:
        with BuildLine():
            CenterArc((40.988707325, -31.512603208), FILLET1_R, 124.197770407, 60.77965812)
            Line((3.032384121, -34.818284502), (0, 0))
            ThreePointArc((0, 0), (9.787278443, -3.010751549), (19.574556886, 0))
        make_face()
    fillet1_piece_11 = extrude(amount=6.99999997, mode=Mode.PRIVATE)
    fillet1_piece_11 = split(fillet1_piece_11, bisect_by=Plane(origin=(44.071417993, 0.329171961, 12.212577706), z_dir=(0.8660254037844373, 0, -0.5000000000000024)), keep=Keep.TOP, mode=Mode.PRIVATE)
    add(fillet1_piece_11)
    with BuildSketch(Plane(origin=(13.087941757, 0, 15.465668216), x_dir=(0.08676328855268206, -0.9962289554914191, 0), z_dir=(0, 0, -1))) as fillet1_piece_12_section:
        with BuildLine():
            CenterArc((40.988707325, -31.512603208), FILLET1_R, 124.197770407, 60.77965812)
            Line((3.032384121, -34.818284502), (0, 0))
            ThreePointArc((0, 0), (9.787278443, -3.010751549), (19.574556886, 0))
        make_face()
    fillet1_piece_12 = extrude(amount=94.37520702, mode=Mode.PRIVATE)
    fillet1_piece_12 = split(fillet1_piece_12, bisect_by=Plane(origin=(23.87513999, -4.28338064, -62.034331754), z_dir=(0, 0, 1)), keep=Keep.TOP, mode=Mode.PRIVATE)
    fillet1_piece_12 = split(fillet1_piece_12, bisect_by=Plane(origin=(23.87513999, -4.28338064, -55.034331754), z_dir=(0, 0, -1)), keep=Keep.TOP, mode=Mode.PRIVATE)
    add(fillet1_piece_12)
    with BuildSketch(Plane(origin=(-13.910575406, 0, -78.909538804), x_dir=(-0.08676328855268226, -0.9962289554914191, 0), z_dir=(0, 0, 1))) as fillet1_piece_13_section:
        with BuildLine():
            CenterArc((40.988707325, -31.512603208), FILLET1_R, 124.197770407, 60.77965812)
            Line((3.032384121, -34.818284502), (0, 0))
            ThreePointArc((0, 0), (9.787278443, -3.010751549), (19.574556886, 0))
        make_face()
    fillet1_piece_13 = extrude(amount=94.37520702, mode=Mode.PRIVATE)
    fillet1_piece_13 = split(fillet1_piece_13, bisect_by=Plane(origin=(-24.69777364, -4.28338064, -62.034331754), z_dir=(0, 0, 1)), keep=Keep.TOP, mode=Mode.PRIVATE)
    fillet1_piece_13 = split(fillet1_piece_13, bisect_by=Plane(origin=(-24.69777364, -4.28338064, -55.034331754), z_dir=(0, 0, -1)), keep=Keep.TOP, mode=Mode.PRIVATE)
    add(fillet1_piece_13)
    with BuildSketch(Plane(origin=(-13.910575406, 0, 8.465668246), x_dir=(-0.0867632885558369, -0.9962289554911443, 0), z_dir=(0, 0, 1))) as fillet1_piece_14_section:
        with BuildLine():
            CenterArc((40.988707325, -31.512603208), FILLET1_R, 124.197770407, 60.77965812)
            Line((3.032384121, -34.818284502), (0, 0))
            ThreePointArc((0, 0), (9.787278443, -3.010751549), (19.574556886, 0))
        make_face()
    fillet1_piece_14 = extrude(amount=6.99999997, mode=Mode.PRIVATE)
    fillet1_piece_14 = split(fillet1_piece_14, bisect_by=Plane(origin=(-44.894051642, 0.329171961, 12.212577706), z_dir=(-0.8660254037844385, 0, -0.5000000000000003)), keep=Keep.TOP, mode=Mode.PRIVATE)
    add(fillet1_piece_14)
    with BuildSketch(Plane(origin=(-13.910575406, 0, 8.465668246), x_dir=(-0.0867632885558369, -0.9962289554911443, 0), z_dir=(0, 0, 1))) as fillet1_piece_15_section:
        with BuildLine():
            CenterArc((40.988707325, -31.512603208), FILLET1_R, 124.197770407, 60.77965812)
            Line((3.032384121, -34.818284502), (0, 0))
            ThreePointArc((0, 0), (9.787278443, -3.010751549), (19.574556886, 0))
        make_face()
    fillet1_piece_15 = extrude(amount=94.37520702, mode=Mode.PRIVATE)
    fillet1_piece_15 = split(fillet1_piece_15, bisect_by=Plane(origin=(-48.157624669, 0.376146064, 15.465668216), z_dir=(0, 0, 1)), keep=Keep.TOP, mode=Mode.PRIVATE)
    fillet1_piece_15 = split(fillet1_piece_15, bisect_by=Plane(origin=(-47.638099539, 0.376146064, 16.965408082), z_dir=(-0.8660254037844385, 0, -0.5000000000000003)), keep=Keep.TOP, mode=Mode.PRIVATE)
    add(fillet1_piece_15)
    with BuildSketch(Plane(origin=(-13.910575406, 0, 8.465668246), x_dir=(-0.0867632885558369, -0.9962289554911443, 0), z_dir=(0, 0, 1))) as fillet1_piece_16_section:
        with BuildLine():
            CenterArc((40.988707325, -31.512603208), FILLET1_R, 124.197770407, 60.77965812)
            Line((3.032384121, -34.818284502), (0, 0))
            ThreePointArc((0, 0), (9.787278443, -3.010751549), (19.574556886, 0))
        make_face()
    fillet1_piece_16 = extrude(amount=6.99999997, mode=Mode.PRIVATE)
    fillet1_piece_16 = split(fillet1_piece_16, bisect_by=Plane(origin=(-39.648984709, -4.363073993, 3.127855288), z_dir=(0.8660254037844385, 0, 0.5000000000000003)), keep=Keep.TOP, mode=Mode.PRIVATE)
    add(fillet1_piece_16)

    # Sketch6 → Cut-Extrude2 (cut, two sides: drawn at the far end of the back side and taken through both)
    with BuildSketch(Plane(origin=(0, 6.35, 0), x_dir=(1, 0, 0), z_dir=(0, 1, 0)).offset(-CUT_EXTRUDE2_DEPTH_BACK)):
        with Locations((-0.411316825, 23.284331754)):
            Rectangle(SKETCH6_W, SKETCH6_H)
    extrude(amount=CUT_EXTRUDE2_DEPTH + CUT_EXTRUDE2_DEPTH_BACK, mode=Mode.SUBTRACT)

    # Fillet2
    fillet2_edges = [part.edges().sort_by_distance(p)[0] for p in [
        (-64.561316825, 3.175, -62.034331754),
        (63.738683175, 3.175, -62.034331754),
        (56.738683175, 3.175, -55.034331754),
        (-57.561316825, 3.175, -55.034331754),
        (-57.561316825, 3.175, 8.465668246),
        (56.738683175, 3.175, 8.465668246),
    ]]
    fillet(fillet2_edges, radius=FILLET2_R)


solid = part.part
